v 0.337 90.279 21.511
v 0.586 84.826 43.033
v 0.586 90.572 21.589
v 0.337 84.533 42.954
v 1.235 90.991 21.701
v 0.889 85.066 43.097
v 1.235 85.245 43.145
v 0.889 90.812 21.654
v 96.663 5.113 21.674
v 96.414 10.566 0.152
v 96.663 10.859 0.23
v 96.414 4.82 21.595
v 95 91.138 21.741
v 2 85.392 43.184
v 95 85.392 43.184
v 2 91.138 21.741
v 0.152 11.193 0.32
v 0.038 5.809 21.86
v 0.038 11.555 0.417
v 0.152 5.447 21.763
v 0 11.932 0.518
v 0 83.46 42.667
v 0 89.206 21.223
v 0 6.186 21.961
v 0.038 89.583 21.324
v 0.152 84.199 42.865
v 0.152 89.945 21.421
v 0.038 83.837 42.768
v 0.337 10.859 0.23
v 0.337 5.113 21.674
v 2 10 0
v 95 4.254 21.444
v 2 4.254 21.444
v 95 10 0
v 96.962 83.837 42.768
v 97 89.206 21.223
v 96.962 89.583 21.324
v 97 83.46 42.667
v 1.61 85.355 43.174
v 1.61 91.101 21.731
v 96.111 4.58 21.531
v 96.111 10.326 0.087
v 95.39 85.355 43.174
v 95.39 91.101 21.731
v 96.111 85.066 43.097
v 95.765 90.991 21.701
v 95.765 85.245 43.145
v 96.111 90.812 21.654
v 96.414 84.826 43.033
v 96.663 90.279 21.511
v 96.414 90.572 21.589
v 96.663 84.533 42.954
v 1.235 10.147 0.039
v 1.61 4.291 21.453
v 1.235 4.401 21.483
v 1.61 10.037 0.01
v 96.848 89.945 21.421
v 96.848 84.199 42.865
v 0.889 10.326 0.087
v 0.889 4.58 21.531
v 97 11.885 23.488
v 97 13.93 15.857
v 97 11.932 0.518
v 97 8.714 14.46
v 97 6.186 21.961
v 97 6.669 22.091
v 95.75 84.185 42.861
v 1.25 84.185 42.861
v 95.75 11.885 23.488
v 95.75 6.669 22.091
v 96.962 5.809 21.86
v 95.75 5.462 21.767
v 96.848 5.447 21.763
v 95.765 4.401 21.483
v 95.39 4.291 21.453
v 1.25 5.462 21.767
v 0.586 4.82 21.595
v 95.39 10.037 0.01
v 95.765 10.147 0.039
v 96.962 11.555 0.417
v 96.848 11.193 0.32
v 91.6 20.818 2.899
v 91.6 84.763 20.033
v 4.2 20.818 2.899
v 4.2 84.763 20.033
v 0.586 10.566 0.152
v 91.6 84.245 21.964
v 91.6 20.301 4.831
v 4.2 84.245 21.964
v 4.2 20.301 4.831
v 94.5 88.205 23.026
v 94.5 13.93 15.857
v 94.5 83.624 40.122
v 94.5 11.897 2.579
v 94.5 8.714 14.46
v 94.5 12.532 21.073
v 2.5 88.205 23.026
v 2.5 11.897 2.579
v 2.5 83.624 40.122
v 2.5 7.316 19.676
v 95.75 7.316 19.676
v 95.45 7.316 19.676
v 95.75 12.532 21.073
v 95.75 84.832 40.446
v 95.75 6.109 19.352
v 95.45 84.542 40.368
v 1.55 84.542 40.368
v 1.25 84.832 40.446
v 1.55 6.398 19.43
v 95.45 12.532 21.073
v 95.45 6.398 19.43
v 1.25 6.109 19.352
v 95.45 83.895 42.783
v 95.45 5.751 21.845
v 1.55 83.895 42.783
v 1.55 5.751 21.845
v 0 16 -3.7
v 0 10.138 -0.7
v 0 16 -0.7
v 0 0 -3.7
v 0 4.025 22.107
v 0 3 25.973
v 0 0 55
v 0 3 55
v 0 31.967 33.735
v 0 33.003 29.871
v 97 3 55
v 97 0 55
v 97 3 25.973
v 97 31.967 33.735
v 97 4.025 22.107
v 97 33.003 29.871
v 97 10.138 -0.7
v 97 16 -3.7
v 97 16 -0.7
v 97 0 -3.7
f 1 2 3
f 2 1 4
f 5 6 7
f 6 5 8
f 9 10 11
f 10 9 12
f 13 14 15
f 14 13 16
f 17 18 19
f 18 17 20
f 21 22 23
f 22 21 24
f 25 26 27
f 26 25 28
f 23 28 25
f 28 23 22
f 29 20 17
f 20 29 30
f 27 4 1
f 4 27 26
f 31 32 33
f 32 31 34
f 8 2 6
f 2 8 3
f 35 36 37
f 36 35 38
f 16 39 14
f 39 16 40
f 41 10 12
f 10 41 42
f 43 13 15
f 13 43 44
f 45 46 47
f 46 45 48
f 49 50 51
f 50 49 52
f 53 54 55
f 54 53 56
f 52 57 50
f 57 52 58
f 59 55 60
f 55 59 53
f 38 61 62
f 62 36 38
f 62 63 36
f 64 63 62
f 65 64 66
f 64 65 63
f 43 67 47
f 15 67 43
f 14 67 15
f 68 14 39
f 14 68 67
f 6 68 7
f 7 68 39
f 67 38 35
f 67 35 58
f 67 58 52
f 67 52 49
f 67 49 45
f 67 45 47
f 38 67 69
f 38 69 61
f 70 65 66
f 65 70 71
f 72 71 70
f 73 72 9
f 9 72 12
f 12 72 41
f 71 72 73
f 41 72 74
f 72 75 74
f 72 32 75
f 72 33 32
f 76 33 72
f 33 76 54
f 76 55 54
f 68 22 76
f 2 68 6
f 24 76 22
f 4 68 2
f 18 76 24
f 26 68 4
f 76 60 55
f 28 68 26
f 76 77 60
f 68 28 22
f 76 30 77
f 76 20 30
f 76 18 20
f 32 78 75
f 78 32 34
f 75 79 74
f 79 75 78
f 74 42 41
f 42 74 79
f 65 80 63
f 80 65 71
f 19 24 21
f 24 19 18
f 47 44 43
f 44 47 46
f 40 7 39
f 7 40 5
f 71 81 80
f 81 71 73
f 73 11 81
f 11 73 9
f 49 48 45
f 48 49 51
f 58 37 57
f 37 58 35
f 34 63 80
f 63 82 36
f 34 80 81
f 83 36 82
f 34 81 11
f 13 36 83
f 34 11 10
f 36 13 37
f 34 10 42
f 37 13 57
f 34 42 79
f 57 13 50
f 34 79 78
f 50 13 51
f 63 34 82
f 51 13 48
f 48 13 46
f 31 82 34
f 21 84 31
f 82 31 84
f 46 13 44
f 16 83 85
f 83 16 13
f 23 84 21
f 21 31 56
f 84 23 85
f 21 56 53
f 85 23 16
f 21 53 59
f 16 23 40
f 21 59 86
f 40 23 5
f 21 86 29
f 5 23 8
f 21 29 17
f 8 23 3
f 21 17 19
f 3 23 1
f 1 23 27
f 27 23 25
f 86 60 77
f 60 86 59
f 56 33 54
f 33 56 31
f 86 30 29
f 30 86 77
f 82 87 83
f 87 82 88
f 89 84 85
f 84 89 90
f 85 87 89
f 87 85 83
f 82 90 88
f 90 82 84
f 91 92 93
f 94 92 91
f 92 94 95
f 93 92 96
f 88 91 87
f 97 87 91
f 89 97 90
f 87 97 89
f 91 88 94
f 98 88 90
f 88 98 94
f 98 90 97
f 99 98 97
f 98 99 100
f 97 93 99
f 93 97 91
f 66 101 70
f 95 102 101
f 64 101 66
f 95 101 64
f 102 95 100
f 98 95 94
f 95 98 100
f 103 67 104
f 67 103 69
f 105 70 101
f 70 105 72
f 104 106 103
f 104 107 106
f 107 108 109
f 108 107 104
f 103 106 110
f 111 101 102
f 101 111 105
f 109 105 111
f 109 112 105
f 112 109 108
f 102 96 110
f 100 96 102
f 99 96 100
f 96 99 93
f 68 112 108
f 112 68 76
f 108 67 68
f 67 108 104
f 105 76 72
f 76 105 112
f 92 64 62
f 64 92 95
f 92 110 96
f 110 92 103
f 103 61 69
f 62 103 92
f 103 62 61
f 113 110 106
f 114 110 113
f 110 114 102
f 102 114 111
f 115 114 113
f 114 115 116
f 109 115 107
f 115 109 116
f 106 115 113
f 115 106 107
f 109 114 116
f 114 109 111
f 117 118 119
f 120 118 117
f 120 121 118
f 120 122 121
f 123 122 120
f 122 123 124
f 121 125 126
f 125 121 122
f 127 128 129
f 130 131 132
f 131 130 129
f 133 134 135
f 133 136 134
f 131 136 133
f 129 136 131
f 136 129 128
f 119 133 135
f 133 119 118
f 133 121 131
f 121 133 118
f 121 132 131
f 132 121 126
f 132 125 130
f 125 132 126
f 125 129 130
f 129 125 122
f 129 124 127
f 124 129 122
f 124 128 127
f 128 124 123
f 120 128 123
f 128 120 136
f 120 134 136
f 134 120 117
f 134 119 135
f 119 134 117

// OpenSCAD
// =============================================================================
// RODZINNE ZADANIA - OBUDOWA E-PAPER 4,2" + XIAO ESP32-S3
// =============================================================================
// Druk: Creality Ender-3 Pro, Devil Design PLA czarny, profil ender3_config.ini.
// Wszystkie czesci drukuja sie BEZ supportow (orientacje ponizej).
// Urzadzenie stoi odchylone o 15 stopni w osobnej podstawce (stand); pokrywa jest plaska.
//
// Uklad wspolrzednych urzadzenia (moduly body(), cover(), fit_test()):
//   X w prawo i Y w gore patrzac od przodu na ekran, Z do tylu (front = 0).
//
// Eksport do druku (orientacja na stole):
//   openscad -D 'part="body"'  -o case_body.stl  epaper_frame.scad   // front na stole
//   openscad -D 'part="cover"' -o case_cover.stl epaper_frame.scad   // plyta na stole
//   openscad -D 'part="fit"'   -o fit_test.stl   epaper_frame.scad   // sama ramka do proby
//   openscad -D 'part="stand"' -o stand.stl      epaper_frame.scad   // podstawka, plyta na stole
//
// Uklad swiata podstawki (moduly stand(), device_on_stand()): X w prawo, Y w gore (blat Y = 0),
// Z do tylu. Urzadzenie = translate([0, seat_h, 0]) rotate([tilt_deg, 0, 0]) w ukladzie urzadzenia.
// Parametry wypisywane przez echo(PARAM_<nazwa> = ...) czytaja testy (tests/).
// =============================================================================

part = "both";

// Luzy dopasowan (suma obu stron). Klejona pokrywa ma wlasny `cover_tol`.
play = 1.4;            // podstawka i kabel
panel_play = 2.0;      // panel: 1 mm na strone; przy 0,7 mm nieregularne scianki wydruku polamaly panel

// === PANEL DEPG0420BNS19AF (zmierzony suwmiarka; obszar aktywny z karty katalogowej) ===
panel_w = 90.0;
panel_h = 77.0;
panel_t = 1.2;
active_w = 84.8;
active_h = 63.6;
// Polozenie obszaru aktywnego (zmierzone): lewa 2,0 mm, dol 9,0 mm (tasma FPC),
// wiec u gory 77.0 - 63.6 - 9.0 = 4.4 mm, a z prawej 90.0 - 84.8 - 2.0 = 3.2 mm.
active_left = 2.0;
active_top = 4.4;
active_bottom = panel_h - active_h - active_top;
window_margin = panel_play / 2 + 0.3;   // panel dosuniety do scianki nadal pokazuje caly ekran (+0,3 mm)

// === STOS NA TYLE PANELU (mm nad tylem panelu) ===
stack_top = 13.5;                      // wierzch XIAO na plytce sterownika (szacunek)
usb_plug_from_front = 17.7;            // zmierzone: front panelu -> oslona wlozonej wtyczki USB-C
usb_plug_top = usb_plug_from_front - panel_t;

// === KORPUS ===
tol = panel_play / 2;  // luz panelu w kieszeni, na strone
wall = 2.5;
front_t = 2.0;         // ramka przed panelem
inner_clear = usb_plug_top;   // od tylu panelu do pokrywy: pokrywa dociska wtyczke na styk
cover_t = 2.5;
ledge = 1.25;          // ciensza tylna krawedz scianki = polka pod pokrywe
cover_tol = 0.3;       // pokrywa klejona: mniejszy luz, zeby lezala na polce
r = 2;                 // zaokraglenie naroznikow

width = panel_w + 2 * tol + 2 * wall;
height = panel_h + 2 * tol + 2 * wall;
depth = front_t + panel_t + inner_clear + cover_t;

panel_x0 = wall + tol;
panel_y0 = wall + tol;
window_w = active_w + 2 * window_margin;
window_h = active_h + 2 * window_margin;
window_x0 = panel_x0 + active_left - window_margin;
window_y0 = panel_y0 + active_bottom - window_margin;

// === WYCIECIE NA KABEL USB (prawa scianka patrzac od przodu) ===
// Wtyczka wlozona na stale; przez scianke przechodzi tylko kabel 4 x 4 mm, przy samym dnie,
// prostopadle w prawo, obok podstawki.
cable_w = 4.0;
notch_w = cable_w + play;                  // wzdluz Y
notch_d = cover_t + cable_w + play;        // wzdluz Z, od tylnej krawedzi; przed pokrywa otwarte cable_w + play
notch_center_y = wall + notch_w / 2;       // dol wyciecia na wewnetrznej powierzchni dolnej scianki

// === POKRYWA (plaska, klejona we wnece) ===
cover_w = width - 2 * ledge - 2 * cover_tol;
cover_h = height - 2 * ledge - 2 * cover_tol;

// === PODSTAWKA (kolyska odchylajaca urzadzenie o 15 stopni do tylu) ===
tilt_deg = 15;
seat_h = 10.0;         // wysokosc przedniej dolnej krawedzi urzadzenia nad blatem
seat_gap = 0.05;       // siedzisko tuz pod urzadzeniem (styk scian nie jest przenikaniem)
lip_h = 6.0;           // warga ponad siedziskiem; zaslania tylko dolny pasek ramki (11,2 mm)
lip_t = 3.0;
stand_tol = play / 2;  // luz przed frontem i za pokrywa
backrest_h = 30.0;     // dlugosc oparcia wzdluz tylnej sciany urzadzenia
backrest_t = 4.0;
base_t = 3.0;
base_front_z = -(stand_tol + lip_t);
base_back_z = 55.0;    // ogon z tylu: srodek masy ~21,5 mm, zapas >= 10 mm z obu stron

fit_test_h = front_t + panel_t + 1.0;

$fn = 32;

module rounded_box(w, h, d) {
    hull() for (x = [r, w - r], y = [r, h - r]) translate([x, y, 0]) cylinder(r = r, h = d);
}

// Korpus w ukladzie urzadzenia.
module body() {
    difference() {
        rounded_box(width, height, depth);
        // okno na obszar aktywny
        translate([window_x0, window_y0, -1]) cube([window_w, window_h, front_t + 2]);
        // kieszen panelu i wnetrze na elektronike (ta sama szerokosc)
        translate([wall, wall, front_t]) cube([width - 2 * wall, height - 2 * wall, depth - cover_t - front_t + 0.01]);
        // wneka na pokrywe: tylna krawedz scianki zweza sie do `ledge`
        translate([ledge, ledge, depth - cover_t]) cube([width - 2 * ledge, height - 2 * ledge, cover_t + 1]);
        // wyciecie na kabel w prawej sciance, otwarte od tylu
        translate([width - wall - 1, notch_center_y - notch_w / 2, depth - notch_d])
            cube([wall + 2, notch_w, notch_d + 1]);
    }
}

// Plaska pokrywa w ukladzie urzadzenia (plyta lezy we wnece korpusu).
module cover() {
    translate([ledge + cover_tol, ledge + cover_tol, depth - cover_t]) cube([cover_w, cover_h, cover_t]);
}

// Szybki wydruk probny: ramka z oknem i kieszen panelu.
module fit_test() {
    intersection() {
        body();
        translate([-1, -1, 0]) cube([width + 2, height + 2, fit_test_h]);
    }
}

// Urzadzenie (korpus + pokrywa) ustawione w podstawce, uklad swiata.
module device_on_stand() {
    translate([0, seat_h, 0]) rotate([tilt_deg, 0, 0]) { body(); cover(); }
}

// Podstawka w ukladzie swiata: profil boczny (Y, Z) wyciagniety na cala szerokosc obudowy.
// Wektory urzadzenia w swiecie (Y, Z): os Y urzadzenia = (cos, sin), os Z urzadzenia = (-sin, cos).
module stand() {
    c = cos(tilt_deg);
    s = sin(tilt_deg);
    function seat_y(z) = seat_h - seat_gap - z * tan(tilt_deg);   // spod urzadzenia, obnizony o seat_gap
    // wewnetrzna dolna krawedz oparcia: tyl urzadzenia + luz, obnizona o seat_gap wzdluz osi Y urzadzenia
    back_d = depth + stand_tol;
    inner_low = [seat_h - back_d * s - seat_gap * c, back_d * c - seat_gap * s];
    inner_top = inner_low + backrest_h * [c, s];
    outer_top = inner_top + backrest_t * [-s, c];
    drop = (outer_top[0] - base_t) / c;                            // zejscie zewnetrzna sciana oparcia do plyty
    outer_low = outer_top - drop * [c, s];
    profile = [                                                    // punkty [Y, Z]
        [0, base_front_z],
        [seat_h + lip_h, base_front_z],
        [seat_h + lip_h, -stand_tol],
        [seat_y(-stand_tol), -stand_tol],
        inner_low,
        inner_top,
        outer_top,
        outer_low,
        [base_t, base_back_z],
        [0, base_back_z],
    ];
    rotate([90, 0, 90]) linear_extrude(width) polygon(profile);   // wielokat (Y, Z) wzdluz X
}

if (part == "body") body();                                         // front na stole
else if (part == "cover") translate([-(ledge + cover_tol), -(ledge + cover_tol), -(depth - cover_t)]) cover();  // plyta na stole
else if (part == "fit") fit_test();
else if (part == "stand") rotate([90, 0, 0]) stand();               // plyta na stole
else { color("DimGray") stand(); color("Gray") device_on_stand(); }

// === PARAMETRY DLA TESTOW I README ===
echo(PARAM_panel_w = panel_w);
echo(PARAM_panel_h = panel_h);
echo(PARAM_panel_t = panel_t);
echo(PARAM_active_w = active_w);
echo(PARAM_active_h = active_h);
echo(PARAM_active_left = active_left);
echo(PARAM_active_top = active_top);
echo(PARAM_window_margin = window_margin);
echo(PARAM_window_w = window_w);
echo(PARAM_window_h = window_h);
echo(PARAM_tol = tol);
echo(PARAM_panel_play = panel_play);
echo(PARAM_wall = wall);
echo(PARAM_front_t = front_t);
echo(PARAM_inner_clear = inner_clear);
echo(PARAM_cover_t = cover_t);
echo(PARAM_ledge = ledge);
echo(PARAM_width = width);
echo(PARAM_height = height);
echo(PARAM_depth = depth);
echo(PARAM_cover_w = cover_w);
echo(PARAM_cover_h = cover_h);
echo(PARAM_tilt_deg = tilt_deg);
echo(PARAM_seat_h = seat_h);
echo(PARAM_lip_h = lip_h);
echo(PARAM_lip_t = lip_t);
echo(PARAM_stand_tol = stand_tol);
echo(PARAM_backrest_h = backrest_h);
echo(PARAM_backrest_t = backrest_t);
echo(PARAM_base_t = base_t);
echo(PARAM_base_front_z = base_front_z);
echo(PARAM_base_back_z = base_back_z);
echo(PARAM_cover_tol = cover_tol);
echo(PARAM_notch_w = notch_w);
echo(PARAM_notch_d = notch_d);
echo(PARAM_notch_center_y = notch_center_y);
echo(PARAM_stack_top = stack_top);
echo(PARAM_usb_plug_top = usb_plug_top);
